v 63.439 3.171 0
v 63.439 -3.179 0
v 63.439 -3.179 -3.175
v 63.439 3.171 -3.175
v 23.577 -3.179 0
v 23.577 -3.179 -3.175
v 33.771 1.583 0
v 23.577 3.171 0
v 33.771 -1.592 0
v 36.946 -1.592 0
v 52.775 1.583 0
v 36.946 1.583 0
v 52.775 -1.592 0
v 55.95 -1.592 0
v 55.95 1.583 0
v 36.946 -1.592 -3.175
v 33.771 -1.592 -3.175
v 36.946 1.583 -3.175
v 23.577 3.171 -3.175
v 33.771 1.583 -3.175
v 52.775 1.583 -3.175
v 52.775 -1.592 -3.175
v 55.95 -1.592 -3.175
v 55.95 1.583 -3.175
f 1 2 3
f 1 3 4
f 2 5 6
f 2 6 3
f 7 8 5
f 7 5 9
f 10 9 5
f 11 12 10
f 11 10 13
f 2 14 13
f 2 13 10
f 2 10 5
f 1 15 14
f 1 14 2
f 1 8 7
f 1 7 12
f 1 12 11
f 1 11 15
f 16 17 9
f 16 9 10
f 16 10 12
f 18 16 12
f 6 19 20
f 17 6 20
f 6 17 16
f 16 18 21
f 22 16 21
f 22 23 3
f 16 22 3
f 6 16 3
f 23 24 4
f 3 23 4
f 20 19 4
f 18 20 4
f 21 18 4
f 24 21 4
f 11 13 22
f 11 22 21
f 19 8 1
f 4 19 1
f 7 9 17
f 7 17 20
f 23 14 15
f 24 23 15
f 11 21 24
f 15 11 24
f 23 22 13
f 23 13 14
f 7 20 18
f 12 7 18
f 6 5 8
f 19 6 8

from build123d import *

# Parameters (mm, degrees)
SKETCH1_W           = 39.86221147
SKETCH1_H           = 6.35
SKETCH1_W_2         = 3.175
SKETCH1_H_2         = 3.175
BOSS_EXTRUDE1_DEPTH = 3.175


with BuildPart() as part:
    # Sketch1 → Boss-Extrude1 (new body)
    with BuildSketch(Plane.XY):
        with Locations((43.507685092, -0.004486266)):
            Rectangle(SKETCH1_W, SKETCH1_H)
        with Locations((54.362348302, -0.004486266)):
            Rectangle(SKETCH1_W_2, SKETCH1_H_2, mode=Mode.SUBTRACT)
        with Locations((35.358431187, -0.004486266)):
            Rectangle(SKETCH1_W_2, SKETCH1_H_2, mode=Mode.SUBTRACT)
    extrude(amount=-BOSS_EXTRUDE1_DEPTH)


solid = part.part
